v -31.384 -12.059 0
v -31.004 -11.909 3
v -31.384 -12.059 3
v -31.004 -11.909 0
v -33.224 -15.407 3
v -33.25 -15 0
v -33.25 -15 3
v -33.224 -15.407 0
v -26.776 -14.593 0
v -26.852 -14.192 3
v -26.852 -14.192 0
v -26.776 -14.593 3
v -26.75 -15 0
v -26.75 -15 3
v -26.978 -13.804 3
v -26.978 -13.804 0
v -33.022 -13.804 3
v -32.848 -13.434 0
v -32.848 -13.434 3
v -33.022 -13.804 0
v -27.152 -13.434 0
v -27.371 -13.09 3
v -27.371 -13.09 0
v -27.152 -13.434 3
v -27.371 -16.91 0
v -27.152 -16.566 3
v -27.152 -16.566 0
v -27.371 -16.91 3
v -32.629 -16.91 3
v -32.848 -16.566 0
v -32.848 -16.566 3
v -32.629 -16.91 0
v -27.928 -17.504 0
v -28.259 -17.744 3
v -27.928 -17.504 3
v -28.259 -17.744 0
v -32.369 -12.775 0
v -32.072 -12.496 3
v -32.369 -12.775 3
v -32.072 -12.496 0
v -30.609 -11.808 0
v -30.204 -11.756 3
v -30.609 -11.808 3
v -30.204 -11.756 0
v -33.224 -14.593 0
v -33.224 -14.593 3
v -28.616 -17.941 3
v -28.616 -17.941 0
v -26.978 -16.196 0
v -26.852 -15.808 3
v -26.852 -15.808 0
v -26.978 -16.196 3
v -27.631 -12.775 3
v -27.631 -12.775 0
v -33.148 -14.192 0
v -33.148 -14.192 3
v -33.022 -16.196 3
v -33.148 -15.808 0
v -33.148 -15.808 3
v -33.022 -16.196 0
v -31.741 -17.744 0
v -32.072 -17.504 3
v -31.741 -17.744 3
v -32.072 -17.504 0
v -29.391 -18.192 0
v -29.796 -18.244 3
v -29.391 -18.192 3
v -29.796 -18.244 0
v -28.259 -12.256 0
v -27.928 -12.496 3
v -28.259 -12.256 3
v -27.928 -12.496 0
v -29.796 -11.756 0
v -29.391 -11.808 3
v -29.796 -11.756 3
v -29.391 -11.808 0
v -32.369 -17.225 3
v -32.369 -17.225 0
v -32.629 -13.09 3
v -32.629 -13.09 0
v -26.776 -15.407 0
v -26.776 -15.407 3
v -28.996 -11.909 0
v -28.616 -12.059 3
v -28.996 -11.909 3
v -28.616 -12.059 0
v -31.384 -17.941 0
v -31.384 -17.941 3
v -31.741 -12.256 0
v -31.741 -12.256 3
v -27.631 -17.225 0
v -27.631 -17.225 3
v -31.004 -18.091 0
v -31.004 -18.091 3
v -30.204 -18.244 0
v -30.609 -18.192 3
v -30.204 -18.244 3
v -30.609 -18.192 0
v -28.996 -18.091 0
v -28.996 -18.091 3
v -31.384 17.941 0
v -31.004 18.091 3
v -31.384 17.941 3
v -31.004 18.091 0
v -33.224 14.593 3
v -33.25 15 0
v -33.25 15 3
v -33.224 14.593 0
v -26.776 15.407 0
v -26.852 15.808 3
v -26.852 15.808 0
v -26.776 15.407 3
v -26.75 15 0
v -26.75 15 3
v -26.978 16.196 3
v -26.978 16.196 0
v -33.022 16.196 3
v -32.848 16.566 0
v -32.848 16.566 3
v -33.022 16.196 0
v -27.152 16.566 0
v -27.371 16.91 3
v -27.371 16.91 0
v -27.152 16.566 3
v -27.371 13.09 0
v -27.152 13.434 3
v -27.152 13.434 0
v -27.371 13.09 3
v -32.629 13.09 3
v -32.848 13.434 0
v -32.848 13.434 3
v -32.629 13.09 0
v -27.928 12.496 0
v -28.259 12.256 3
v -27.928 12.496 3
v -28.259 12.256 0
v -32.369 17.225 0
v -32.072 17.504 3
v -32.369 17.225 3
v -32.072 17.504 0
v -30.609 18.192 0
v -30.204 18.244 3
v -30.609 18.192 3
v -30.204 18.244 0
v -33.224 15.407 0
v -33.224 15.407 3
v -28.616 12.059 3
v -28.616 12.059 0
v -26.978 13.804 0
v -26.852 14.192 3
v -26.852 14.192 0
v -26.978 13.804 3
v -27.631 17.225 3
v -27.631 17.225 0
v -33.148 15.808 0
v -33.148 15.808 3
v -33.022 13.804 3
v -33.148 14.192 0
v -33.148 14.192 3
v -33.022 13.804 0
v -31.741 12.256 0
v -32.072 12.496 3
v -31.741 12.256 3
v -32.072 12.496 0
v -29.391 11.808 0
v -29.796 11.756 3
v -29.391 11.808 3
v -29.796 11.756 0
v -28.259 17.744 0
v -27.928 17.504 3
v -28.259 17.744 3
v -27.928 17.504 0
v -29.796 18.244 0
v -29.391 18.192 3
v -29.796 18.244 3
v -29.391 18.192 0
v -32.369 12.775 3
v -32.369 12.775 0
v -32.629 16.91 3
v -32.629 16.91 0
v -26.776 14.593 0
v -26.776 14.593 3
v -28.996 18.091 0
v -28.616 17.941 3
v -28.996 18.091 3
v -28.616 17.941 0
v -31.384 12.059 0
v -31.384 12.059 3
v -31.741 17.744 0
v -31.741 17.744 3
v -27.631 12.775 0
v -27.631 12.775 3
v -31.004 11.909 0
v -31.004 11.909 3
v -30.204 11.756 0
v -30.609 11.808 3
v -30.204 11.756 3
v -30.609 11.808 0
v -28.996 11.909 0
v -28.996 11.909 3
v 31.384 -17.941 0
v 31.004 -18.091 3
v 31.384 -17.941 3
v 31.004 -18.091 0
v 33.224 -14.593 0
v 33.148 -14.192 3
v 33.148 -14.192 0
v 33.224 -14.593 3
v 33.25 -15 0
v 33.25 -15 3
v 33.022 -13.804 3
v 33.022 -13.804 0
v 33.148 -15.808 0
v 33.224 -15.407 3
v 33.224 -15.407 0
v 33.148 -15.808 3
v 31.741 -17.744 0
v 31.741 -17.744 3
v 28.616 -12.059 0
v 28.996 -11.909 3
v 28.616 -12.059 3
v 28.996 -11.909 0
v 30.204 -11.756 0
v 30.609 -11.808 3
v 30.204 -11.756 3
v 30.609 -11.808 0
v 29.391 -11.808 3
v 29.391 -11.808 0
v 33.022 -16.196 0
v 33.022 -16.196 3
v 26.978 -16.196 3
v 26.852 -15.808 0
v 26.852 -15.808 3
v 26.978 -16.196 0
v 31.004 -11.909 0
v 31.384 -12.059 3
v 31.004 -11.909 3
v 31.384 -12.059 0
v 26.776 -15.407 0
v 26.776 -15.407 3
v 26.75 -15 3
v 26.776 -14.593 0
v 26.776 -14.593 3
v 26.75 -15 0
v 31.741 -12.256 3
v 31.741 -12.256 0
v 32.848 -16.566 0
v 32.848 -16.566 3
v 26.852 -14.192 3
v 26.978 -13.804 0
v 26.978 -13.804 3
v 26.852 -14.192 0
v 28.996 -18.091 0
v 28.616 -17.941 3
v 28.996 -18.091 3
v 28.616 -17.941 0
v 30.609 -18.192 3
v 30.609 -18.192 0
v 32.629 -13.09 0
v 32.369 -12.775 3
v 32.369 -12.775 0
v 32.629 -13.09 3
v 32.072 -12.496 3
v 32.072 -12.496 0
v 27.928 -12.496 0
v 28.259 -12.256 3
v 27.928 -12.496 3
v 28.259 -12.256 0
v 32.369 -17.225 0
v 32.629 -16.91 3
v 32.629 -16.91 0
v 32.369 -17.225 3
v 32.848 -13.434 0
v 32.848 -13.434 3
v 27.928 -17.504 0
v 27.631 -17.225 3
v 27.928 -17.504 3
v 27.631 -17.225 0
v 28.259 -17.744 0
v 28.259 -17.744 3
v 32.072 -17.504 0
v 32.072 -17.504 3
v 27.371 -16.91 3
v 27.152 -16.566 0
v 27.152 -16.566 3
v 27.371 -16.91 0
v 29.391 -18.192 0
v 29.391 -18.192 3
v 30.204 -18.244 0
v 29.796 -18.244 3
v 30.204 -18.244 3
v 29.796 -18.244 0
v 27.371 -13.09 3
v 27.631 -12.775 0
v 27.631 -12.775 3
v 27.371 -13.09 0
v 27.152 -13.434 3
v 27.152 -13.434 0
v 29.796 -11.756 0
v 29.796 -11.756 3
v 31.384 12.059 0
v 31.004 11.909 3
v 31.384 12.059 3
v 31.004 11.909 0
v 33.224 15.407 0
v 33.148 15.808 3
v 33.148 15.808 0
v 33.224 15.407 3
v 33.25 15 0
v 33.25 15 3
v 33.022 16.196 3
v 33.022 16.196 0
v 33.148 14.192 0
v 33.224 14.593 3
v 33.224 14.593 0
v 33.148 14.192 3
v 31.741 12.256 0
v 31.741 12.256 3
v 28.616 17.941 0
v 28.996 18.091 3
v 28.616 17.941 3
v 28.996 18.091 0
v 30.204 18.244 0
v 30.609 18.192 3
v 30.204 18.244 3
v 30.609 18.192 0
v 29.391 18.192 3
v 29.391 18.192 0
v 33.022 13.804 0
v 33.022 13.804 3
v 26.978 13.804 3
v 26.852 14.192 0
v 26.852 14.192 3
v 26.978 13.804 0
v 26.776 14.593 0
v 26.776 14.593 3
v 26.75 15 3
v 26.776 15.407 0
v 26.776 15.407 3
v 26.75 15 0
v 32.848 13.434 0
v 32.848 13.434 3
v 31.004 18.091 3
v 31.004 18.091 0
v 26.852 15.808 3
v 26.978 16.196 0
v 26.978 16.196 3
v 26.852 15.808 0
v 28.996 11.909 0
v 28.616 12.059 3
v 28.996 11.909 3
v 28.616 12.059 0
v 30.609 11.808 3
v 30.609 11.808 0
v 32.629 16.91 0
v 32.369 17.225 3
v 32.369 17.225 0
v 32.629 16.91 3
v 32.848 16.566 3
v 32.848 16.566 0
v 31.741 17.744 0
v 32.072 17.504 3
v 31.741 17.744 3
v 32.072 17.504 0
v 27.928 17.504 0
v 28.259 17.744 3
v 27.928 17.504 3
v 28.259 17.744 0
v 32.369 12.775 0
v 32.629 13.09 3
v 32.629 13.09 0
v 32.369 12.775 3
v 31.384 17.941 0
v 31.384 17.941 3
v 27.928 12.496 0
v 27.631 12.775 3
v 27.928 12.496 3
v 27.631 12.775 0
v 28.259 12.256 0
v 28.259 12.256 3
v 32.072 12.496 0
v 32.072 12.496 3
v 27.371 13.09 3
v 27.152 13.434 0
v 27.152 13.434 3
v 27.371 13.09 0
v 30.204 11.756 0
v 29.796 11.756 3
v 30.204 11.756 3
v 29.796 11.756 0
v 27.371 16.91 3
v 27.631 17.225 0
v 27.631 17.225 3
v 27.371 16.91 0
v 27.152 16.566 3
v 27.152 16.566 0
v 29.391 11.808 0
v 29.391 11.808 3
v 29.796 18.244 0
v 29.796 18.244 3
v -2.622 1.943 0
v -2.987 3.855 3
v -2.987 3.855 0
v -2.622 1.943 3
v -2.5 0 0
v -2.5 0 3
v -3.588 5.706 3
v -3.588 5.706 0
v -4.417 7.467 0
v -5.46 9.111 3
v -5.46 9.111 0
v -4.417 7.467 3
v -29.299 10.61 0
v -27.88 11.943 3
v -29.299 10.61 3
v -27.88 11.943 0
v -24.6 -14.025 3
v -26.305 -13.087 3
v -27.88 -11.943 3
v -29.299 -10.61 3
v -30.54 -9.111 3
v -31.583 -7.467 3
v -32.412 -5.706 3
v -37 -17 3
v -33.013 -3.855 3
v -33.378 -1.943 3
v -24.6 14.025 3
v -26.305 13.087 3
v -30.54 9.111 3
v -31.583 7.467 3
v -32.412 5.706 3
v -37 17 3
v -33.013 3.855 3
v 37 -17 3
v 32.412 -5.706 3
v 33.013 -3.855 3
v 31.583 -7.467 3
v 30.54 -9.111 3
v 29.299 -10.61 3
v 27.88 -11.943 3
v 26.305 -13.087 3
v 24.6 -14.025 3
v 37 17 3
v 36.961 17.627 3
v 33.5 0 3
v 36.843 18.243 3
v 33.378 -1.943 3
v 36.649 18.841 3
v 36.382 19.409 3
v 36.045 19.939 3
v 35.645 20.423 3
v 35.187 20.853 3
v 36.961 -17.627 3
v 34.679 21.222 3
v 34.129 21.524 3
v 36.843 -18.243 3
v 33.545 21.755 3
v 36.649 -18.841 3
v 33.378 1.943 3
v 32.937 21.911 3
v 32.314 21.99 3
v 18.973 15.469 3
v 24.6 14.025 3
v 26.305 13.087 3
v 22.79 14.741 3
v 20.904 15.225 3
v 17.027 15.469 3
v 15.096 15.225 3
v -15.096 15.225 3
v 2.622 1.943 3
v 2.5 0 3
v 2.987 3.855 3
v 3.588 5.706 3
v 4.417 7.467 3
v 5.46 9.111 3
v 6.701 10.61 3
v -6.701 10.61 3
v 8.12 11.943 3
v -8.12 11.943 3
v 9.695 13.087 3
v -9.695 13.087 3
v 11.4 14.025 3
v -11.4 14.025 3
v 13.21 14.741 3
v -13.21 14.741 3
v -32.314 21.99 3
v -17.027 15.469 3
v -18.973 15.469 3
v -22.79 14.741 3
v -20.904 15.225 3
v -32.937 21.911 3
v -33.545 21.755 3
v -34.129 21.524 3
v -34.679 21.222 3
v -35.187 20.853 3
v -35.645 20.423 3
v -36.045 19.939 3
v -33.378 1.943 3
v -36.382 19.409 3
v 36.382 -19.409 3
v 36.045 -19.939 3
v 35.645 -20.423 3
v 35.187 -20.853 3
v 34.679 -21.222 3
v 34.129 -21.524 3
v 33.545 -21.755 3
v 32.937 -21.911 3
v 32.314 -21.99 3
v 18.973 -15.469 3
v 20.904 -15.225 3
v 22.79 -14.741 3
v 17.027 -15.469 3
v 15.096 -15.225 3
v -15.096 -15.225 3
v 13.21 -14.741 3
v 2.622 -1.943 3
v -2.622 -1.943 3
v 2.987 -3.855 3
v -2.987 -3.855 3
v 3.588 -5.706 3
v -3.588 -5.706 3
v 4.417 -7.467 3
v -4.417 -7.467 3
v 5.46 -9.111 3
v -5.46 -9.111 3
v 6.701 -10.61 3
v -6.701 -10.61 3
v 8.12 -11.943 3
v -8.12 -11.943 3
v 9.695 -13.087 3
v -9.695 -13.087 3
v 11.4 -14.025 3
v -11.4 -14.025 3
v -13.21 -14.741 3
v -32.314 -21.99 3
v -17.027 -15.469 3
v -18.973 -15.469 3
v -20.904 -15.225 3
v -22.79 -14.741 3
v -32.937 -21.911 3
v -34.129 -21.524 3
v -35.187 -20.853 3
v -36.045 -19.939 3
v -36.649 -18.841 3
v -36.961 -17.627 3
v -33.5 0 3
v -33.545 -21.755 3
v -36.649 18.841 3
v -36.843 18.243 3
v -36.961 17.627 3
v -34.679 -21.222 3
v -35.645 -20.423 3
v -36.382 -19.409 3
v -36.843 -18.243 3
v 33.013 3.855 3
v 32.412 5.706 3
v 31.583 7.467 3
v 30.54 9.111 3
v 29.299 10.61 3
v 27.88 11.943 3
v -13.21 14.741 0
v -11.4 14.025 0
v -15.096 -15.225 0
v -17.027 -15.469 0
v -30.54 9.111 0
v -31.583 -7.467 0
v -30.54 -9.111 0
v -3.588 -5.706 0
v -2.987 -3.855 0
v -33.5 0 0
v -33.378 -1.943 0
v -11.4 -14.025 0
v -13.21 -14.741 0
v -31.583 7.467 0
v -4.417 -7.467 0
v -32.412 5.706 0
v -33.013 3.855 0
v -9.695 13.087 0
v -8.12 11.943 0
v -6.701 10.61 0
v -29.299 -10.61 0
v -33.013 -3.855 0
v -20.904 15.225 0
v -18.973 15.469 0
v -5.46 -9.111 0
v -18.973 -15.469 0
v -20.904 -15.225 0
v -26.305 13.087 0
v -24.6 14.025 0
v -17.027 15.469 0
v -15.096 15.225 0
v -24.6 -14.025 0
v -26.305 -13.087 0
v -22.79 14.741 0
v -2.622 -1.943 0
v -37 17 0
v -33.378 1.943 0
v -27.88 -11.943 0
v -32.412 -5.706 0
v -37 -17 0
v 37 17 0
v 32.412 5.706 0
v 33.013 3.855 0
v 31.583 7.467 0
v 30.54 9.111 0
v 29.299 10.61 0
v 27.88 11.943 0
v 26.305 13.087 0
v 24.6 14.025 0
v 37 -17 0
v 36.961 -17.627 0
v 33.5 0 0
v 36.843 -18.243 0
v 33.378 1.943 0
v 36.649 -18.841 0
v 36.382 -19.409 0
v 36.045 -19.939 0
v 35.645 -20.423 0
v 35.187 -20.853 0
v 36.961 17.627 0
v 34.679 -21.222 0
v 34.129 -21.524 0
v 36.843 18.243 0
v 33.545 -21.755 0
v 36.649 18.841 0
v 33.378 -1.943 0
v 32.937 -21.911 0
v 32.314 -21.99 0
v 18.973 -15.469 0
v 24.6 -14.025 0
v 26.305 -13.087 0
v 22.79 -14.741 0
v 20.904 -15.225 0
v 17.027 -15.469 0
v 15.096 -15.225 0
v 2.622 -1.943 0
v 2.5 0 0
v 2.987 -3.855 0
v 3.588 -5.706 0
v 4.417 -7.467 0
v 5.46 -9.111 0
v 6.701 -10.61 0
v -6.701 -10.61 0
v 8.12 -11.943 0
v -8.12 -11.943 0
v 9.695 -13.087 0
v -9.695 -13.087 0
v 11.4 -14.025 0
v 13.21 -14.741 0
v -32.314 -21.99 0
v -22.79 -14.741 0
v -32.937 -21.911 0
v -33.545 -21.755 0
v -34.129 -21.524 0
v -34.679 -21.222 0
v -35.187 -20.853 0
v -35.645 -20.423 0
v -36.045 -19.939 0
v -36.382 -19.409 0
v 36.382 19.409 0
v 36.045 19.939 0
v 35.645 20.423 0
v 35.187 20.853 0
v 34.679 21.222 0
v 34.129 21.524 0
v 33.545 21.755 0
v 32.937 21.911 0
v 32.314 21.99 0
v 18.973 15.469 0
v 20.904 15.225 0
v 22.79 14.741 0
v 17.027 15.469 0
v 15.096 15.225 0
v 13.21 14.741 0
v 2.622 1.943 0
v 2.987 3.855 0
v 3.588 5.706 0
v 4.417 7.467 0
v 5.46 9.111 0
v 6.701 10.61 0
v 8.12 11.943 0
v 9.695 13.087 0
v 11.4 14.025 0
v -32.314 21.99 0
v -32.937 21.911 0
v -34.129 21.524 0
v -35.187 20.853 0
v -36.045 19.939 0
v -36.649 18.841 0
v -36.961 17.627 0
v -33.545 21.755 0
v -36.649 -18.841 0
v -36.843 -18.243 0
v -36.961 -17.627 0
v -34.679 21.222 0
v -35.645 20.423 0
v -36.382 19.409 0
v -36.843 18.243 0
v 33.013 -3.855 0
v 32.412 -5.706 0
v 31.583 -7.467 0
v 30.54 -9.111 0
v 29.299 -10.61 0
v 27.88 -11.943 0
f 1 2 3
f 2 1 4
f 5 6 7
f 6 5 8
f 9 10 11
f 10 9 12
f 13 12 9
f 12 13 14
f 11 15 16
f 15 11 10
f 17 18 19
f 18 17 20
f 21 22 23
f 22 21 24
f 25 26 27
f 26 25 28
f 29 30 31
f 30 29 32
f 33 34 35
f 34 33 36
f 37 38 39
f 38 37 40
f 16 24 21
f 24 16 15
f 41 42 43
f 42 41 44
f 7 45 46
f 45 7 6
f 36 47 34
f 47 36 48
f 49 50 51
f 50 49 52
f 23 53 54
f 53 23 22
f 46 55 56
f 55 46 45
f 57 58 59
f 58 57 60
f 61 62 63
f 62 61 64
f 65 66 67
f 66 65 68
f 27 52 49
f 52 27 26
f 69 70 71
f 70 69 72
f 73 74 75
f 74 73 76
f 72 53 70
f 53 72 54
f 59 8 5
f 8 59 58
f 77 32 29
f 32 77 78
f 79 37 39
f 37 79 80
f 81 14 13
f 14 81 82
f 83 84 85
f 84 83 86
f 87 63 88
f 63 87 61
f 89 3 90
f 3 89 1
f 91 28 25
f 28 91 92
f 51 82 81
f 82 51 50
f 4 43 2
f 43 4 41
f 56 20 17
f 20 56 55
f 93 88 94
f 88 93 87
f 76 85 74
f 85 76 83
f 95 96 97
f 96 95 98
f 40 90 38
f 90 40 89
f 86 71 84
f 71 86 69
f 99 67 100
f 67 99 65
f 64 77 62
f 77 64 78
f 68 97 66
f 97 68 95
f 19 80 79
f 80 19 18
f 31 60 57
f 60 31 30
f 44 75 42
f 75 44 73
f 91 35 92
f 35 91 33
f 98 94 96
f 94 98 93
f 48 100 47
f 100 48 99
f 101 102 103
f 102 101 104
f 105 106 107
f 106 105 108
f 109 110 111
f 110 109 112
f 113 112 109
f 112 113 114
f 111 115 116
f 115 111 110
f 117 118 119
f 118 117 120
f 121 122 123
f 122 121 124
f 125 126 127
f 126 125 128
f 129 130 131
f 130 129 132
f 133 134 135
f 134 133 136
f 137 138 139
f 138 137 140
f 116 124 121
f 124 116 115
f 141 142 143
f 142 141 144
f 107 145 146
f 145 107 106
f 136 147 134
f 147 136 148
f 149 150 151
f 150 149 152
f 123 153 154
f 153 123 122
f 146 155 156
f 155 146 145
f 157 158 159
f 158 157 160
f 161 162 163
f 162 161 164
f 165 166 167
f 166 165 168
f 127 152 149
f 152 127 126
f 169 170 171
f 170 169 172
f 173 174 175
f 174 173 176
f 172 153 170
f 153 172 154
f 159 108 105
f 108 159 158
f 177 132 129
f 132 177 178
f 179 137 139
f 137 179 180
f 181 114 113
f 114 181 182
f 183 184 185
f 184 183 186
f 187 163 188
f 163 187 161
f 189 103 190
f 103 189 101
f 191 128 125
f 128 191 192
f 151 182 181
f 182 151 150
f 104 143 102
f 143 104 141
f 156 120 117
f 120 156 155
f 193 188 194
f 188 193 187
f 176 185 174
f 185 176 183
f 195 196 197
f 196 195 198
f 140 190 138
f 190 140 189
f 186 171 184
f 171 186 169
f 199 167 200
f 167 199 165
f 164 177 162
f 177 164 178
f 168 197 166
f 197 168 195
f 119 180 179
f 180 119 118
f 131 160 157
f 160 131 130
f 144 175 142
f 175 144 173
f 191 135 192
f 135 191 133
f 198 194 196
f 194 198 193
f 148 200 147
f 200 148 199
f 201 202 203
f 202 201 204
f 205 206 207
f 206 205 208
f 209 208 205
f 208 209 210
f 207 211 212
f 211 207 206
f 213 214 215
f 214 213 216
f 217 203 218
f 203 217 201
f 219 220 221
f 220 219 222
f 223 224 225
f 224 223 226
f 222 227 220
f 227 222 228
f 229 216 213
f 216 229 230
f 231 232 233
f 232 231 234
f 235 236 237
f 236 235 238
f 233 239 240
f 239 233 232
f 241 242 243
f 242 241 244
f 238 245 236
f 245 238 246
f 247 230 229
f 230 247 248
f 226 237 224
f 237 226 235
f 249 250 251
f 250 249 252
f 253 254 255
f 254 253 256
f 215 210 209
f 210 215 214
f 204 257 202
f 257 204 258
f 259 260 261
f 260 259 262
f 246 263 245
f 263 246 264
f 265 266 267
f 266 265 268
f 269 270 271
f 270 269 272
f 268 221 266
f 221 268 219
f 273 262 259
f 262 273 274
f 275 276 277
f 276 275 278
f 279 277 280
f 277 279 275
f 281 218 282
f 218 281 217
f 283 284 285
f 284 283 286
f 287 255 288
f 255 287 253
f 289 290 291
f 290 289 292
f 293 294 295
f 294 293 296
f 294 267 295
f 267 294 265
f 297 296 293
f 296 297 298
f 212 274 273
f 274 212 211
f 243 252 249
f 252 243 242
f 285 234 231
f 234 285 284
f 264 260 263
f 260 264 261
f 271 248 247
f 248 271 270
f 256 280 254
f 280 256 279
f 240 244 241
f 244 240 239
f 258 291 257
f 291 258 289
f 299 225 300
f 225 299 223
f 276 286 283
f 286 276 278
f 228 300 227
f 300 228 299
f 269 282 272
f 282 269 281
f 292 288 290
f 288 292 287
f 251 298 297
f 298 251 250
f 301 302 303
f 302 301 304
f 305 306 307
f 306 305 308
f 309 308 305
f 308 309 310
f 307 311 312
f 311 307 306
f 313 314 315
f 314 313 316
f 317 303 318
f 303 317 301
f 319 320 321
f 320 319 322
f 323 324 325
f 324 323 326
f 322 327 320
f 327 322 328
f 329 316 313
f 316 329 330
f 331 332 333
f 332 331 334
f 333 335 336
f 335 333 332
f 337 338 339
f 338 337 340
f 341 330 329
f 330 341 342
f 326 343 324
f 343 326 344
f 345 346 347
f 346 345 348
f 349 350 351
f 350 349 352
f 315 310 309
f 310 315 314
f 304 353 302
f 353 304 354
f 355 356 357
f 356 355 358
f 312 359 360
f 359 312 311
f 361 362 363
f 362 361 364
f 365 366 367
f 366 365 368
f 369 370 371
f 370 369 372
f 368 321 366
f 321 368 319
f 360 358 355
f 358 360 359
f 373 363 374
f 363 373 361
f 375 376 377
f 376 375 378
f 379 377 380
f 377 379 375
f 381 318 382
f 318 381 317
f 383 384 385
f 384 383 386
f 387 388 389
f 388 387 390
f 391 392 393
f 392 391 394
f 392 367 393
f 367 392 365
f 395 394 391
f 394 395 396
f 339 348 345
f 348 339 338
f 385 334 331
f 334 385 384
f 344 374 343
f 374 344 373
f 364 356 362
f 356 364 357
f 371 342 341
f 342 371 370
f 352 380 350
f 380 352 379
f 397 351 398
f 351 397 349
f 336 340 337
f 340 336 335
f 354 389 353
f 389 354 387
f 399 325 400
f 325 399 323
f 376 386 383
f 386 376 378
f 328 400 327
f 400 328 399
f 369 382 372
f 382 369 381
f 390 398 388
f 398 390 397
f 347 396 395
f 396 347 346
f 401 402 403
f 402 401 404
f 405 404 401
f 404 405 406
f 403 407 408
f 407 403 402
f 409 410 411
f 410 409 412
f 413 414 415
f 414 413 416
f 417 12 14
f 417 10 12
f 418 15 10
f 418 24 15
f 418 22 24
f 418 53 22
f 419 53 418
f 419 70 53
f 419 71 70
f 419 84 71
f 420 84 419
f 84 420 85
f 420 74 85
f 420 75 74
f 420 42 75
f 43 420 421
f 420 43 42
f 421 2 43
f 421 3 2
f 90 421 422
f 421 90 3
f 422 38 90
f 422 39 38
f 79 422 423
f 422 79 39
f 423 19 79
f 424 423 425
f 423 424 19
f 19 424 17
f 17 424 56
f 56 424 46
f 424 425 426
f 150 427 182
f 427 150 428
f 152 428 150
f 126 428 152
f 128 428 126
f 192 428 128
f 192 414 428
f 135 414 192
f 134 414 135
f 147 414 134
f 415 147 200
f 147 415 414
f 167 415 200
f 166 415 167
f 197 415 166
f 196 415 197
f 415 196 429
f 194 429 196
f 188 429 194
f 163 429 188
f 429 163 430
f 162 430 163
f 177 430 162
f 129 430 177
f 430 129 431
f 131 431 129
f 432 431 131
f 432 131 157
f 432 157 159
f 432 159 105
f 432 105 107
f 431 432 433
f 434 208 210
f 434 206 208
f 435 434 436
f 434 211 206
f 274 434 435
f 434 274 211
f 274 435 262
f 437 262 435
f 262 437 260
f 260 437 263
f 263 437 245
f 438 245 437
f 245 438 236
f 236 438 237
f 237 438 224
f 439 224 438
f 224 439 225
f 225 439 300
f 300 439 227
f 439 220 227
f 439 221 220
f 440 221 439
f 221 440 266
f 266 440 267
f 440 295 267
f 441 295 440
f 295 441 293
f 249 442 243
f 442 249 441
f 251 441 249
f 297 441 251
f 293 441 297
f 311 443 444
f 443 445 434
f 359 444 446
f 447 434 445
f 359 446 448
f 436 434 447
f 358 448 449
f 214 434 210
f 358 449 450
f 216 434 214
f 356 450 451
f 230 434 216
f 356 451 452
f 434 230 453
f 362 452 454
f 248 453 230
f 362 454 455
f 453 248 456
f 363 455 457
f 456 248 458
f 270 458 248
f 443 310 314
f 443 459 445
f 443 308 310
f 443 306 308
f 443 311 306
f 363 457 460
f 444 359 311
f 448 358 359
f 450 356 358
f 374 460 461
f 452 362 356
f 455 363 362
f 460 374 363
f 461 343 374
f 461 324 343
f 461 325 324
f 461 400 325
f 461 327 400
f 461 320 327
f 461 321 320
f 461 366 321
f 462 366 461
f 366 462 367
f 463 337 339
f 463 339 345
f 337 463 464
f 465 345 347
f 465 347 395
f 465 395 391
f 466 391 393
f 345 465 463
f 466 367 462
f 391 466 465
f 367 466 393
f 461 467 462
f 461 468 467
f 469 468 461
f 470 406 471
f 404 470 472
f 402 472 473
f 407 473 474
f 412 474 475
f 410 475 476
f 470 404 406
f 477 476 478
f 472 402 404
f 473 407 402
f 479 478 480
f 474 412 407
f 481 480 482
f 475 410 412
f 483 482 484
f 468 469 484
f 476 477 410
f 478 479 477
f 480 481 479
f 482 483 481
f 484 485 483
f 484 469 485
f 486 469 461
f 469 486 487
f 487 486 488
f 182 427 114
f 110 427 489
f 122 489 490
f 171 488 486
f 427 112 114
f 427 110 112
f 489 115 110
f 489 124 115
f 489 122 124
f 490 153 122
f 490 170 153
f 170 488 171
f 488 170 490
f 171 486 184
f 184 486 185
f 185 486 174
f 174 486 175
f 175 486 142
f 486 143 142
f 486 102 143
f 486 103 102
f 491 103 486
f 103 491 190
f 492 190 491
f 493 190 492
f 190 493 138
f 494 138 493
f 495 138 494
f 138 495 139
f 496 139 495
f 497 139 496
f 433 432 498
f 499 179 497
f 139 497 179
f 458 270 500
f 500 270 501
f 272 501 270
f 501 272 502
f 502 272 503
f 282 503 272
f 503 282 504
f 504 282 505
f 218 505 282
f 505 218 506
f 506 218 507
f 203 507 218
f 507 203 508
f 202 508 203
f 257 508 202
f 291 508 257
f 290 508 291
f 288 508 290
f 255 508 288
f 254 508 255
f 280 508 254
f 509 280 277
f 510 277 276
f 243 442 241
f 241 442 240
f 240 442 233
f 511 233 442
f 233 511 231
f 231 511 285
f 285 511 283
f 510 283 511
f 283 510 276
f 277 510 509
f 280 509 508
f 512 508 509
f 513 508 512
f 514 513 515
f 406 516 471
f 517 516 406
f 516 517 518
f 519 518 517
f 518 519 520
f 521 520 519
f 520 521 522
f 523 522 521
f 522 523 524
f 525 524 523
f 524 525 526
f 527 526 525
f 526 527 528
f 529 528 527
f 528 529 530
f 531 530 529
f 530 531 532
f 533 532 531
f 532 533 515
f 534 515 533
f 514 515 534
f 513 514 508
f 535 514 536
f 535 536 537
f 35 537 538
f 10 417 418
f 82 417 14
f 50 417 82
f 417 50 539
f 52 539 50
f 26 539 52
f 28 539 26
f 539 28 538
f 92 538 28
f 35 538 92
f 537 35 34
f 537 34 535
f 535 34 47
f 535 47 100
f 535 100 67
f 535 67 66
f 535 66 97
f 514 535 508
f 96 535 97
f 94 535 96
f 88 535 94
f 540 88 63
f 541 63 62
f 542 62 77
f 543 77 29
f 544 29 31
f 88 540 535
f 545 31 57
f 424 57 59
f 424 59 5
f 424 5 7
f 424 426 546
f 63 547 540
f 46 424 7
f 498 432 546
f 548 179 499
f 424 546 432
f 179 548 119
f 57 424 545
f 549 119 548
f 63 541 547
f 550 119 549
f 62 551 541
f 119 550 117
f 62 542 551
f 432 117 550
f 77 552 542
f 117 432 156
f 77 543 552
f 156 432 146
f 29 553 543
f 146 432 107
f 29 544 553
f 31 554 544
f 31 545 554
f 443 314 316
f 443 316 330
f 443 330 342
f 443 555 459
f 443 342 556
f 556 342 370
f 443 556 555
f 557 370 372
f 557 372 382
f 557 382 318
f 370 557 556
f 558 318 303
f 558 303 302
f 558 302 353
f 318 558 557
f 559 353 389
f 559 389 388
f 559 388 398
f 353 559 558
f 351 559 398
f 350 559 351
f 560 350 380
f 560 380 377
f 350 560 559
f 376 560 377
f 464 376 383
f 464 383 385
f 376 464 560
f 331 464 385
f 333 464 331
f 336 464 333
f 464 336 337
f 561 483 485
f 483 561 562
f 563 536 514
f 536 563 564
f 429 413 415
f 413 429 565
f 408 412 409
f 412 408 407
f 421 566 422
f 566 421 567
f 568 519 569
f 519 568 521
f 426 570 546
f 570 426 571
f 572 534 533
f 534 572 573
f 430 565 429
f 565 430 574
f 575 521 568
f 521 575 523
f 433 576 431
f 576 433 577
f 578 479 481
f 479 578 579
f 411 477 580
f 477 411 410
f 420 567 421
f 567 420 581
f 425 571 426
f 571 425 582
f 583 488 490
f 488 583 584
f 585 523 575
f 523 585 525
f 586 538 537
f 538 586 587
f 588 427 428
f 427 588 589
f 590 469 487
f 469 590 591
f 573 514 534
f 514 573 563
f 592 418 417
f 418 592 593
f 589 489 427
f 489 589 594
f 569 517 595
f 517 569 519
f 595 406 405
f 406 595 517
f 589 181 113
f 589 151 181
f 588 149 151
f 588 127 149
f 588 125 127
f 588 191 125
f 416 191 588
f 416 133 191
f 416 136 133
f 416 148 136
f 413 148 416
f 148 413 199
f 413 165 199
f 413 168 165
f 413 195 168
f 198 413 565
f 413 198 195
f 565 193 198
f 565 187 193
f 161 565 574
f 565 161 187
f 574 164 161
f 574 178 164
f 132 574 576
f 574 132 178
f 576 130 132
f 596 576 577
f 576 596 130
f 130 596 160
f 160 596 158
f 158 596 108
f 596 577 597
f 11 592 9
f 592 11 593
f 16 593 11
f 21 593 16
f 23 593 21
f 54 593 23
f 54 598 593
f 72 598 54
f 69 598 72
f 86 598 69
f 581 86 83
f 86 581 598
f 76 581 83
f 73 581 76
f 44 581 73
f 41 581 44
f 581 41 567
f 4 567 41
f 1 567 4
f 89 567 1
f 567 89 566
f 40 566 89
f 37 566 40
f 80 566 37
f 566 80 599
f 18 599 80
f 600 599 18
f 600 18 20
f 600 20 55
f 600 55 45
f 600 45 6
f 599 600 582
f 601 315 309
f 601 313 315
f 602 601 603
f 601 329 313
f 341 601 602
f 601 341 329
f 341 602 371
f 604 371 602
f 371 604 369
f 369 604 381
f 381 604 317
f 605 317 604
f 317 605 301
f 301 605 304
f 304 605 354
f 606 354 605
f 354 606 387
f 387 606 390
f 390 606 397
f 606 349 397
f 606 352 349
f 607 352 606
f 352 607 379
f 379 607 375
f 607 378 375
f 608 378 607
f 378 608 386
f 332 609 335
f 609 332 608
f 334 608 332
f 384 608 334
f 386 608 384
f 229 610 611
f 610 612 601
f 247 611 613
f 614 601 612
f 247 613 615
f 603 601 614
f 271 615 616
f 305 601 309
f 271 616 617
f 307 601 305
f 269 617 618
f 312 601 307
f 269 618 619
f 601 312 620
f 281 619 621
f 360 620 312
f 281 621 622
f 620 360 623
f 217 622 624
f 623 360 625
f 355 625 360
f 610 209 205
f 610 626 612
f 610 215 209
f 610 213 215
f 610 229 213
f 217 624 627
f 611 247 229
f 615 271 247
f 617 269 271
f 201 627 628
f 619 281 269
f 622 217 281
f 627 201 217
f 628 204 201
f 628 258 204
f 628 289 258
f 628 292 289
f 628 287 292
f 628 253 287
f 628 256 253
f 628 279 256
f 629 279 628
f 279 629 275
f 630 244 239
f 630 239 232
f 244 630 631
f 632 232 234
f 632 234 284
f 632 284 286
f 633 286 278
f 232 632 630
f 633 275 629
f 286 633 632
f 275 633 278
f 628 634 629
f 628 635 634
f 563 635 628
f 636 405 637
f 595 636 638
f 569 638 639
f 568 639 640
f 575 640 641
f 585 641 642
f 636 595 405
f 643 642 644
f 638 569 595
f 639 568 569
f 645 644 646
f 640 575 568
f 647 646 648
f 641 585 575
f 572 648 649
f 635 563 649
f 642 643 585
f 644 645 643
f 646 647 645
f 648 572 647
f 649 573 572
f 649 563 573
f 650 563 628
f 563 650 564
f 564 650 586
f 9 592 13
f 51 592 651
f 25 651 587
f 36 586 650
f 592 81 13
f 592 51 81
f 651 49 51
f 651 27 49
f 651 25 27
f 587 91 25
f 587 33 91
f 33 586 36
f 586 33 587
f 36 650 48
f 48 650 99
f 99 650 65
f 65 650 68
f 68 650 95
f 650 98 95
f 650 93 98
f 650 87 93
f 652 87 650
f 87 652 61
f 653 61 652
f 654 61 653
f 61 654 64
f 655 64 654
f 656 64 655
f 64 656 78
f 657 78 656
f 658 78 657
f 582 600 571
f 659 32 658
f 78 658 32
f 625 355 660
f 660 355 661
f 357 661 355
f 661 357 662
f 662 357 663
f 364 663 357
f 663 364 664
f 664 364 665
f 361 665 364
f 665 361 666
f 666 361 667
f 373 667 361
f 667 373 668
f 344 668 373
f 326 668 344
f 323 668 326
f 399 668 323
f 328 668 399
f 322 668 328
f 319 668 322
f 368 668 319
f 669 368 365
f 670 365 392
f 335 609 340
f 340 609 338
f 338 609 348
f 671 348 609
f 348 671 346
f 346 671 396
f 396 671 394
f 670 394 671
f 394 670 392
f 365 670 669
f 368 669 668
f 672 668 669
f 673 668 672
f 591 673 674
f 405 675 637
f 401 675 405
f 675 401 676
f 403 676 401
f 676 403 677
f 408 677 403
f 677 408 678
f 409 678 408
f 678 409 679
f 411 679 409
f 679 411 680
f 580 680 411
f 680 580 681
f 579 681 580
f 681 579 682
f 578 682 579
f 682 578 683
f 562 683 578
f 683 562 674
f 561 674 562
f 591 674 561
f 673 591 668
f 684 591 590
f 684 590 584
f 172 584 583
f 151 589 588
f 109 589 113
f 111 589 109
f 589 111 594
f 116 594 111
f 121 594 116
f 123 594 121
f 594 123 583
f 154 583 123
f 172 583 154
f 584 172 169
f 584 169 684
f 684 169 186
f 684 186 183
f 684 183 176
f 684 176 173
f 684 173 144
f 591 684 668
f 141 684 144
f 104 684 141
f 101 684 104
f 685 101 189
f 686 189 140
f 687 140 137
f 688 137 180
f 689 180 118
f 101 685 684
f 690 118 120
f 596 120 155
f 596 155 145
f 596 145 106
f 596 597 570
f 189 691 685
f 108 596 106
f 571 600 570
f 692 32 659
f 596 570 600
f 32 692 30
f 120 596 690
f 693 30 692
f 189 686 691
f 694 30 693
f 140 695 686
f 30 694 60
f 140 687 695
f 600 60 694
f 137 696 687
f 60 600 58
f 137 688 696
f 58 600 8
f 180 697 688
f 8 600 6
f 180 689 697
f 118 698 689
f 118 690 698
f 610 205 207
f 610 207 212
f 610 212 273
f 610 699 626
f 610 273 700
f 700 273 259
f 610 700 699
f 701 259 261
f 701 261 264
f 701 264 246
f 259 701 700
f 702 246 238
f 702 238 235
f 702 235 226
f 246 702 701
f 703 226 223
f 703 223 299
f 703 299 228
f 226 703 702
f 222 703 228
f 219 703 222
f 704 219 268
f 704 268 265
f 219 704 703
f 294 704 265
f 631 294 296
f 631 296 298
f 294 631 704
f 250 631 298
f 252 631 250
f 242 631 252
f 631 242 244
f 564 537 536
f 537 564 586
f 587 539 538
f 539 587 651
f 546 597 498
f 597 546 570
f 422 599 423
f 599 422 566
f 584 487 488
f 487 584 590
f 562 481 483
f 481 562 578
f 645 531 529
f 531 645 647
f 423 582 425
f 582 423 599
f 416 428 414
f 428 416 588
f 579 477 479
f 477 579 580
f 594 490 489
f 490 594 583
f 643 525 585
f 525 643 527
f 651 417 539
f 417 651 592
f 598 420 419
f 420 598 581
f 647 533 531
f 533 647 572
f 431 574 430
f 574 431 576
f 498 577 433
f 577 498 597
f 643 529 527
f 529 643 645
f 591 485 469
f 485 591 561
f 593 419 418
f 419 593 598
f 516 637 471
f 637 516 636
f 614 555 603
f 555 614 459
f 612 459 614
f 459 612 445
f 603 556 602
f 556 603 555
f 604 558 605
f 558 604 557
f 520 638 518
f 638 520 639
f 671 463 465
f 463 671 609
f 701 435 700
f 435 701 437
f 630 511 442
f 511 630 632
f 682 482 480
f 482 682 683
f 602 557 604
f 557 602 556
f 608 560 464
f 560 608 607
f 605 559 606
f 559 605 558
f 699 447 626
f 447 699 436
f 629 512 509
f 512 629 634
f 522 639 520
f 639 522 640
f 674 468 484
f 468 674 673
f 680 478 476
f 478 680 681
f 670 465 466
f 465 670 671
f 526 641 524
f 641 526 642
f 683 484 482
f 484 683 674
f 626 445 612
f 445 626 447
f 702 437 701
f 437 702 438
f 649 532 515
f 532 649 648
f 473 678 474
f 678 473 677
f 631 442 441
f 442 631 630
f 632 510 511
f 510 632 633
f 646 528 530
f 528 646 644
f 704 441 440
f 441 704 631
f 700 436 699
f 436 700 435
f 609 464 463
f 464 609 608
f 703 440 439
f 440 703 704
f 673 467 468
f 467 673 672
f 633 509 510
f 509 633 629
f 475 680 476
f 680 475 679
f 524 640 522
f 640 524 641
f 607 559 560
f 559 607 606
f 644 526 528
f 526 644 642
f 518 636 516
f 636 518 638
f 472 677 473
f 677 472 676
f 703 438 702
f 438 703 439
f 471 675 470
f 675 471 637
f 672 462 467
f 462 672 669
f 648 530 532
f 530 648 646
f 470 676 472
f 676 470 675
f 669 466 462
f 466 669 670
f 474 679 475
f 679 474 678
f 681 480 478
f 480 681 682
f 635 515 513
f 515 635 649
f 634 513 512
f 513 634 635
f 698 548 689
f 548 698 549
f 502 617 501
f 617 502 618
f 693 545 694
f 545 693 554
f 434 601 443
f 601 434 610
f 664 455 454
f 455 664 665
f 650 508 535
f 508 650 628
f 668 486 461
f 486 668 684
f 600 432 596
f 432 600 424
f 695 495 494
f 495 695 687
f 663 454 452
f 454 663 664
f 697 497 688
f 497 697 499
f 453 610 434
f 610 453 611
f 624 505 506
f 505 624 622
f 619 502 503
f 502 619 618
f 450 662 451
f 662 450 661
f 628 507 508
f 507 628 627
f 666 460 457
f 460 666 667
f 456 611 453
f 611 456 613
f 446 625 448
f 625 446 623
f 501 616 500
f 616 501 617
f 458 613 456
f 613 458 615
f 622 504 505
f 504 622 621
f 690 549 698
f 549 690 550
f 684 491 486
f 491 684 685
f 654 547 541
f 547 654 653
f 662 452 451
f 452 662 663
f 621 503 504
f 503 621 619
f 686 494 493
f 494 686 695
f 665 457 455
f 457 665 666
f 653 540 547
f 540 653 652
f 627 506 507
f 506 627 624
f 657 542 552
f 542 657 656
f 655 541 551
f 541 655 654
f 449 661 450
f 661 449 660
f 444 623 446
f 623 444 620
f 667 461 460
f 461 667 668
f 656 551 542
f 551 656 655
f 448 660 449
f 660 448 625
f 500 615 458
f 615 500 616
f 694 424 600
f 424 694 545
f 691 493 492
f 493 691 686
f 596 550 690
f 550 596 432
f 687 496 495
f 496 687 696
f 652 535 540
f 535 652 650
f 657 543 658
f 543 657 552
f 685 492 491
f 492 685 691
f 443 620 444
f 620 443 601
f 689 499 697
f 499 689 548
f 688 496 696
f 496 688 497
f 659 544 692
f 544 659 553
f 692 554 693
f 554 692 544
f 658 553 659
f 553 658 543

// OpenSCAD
$fn = 50;

difference() {
	union() {
		hull() {
			translate(v = [-32.0, 17.0, 0]) {
				cylinder(h = 3, r = 5);
			}
			translate(v = [32.0, 17.0, 0]) {
				cylinder(h = 3, r = 5);
			}
			translate(v = [-32.0, -17.0, 0]) {
				cylinder(h = 3, r = 5);
			}
			translate(v = [32.0, -17.0, 0]) {
				cylinder(h = 3, r = 5);
			}
		}
	}
	union() {
		translate(v = [-30.0, -15.0, -100.0]) {
			cylinder(h = 200, r = 3.25);
		}
		translate(v = [-30.0, 15.0, -100.0]) {
			cylinder(h = 200, r = 3.25);
		}
		translate(v = [30.0, -15.0, -100.0]) {
			cylinder(h = 200, r = 3.25);
		}
		translate(v = [30.0, 15.0, -100.0]) {
			cylinder(h = 200, r = 3.25);
		}
		translate(v = [-30.0, -15.0, -100.0]) {
			cylinder(h = 200, r = 1.8);
		}
		translate(v = [-30.0, 15.0, -100.0]) {
			cylinder(h = 200, r = 1.8);
		}
		translate(v = [30.0, -15.0, -100.0]) {
			cylinder(h = 200, r = 1.8);
		}
		translate(v = [30.0, 15.0, -100.0]) {
			cylinder(h = 200, r = 1.8);
		}
		translate(v = [-18.0, 0, 0.0]) {
			cylinder(h = 3, r = 15.5);
		}
		translate(v = [18.0, 0, 0.0]) {
			cylinder(h = 3, r = 15.5);
		}
	}
}
